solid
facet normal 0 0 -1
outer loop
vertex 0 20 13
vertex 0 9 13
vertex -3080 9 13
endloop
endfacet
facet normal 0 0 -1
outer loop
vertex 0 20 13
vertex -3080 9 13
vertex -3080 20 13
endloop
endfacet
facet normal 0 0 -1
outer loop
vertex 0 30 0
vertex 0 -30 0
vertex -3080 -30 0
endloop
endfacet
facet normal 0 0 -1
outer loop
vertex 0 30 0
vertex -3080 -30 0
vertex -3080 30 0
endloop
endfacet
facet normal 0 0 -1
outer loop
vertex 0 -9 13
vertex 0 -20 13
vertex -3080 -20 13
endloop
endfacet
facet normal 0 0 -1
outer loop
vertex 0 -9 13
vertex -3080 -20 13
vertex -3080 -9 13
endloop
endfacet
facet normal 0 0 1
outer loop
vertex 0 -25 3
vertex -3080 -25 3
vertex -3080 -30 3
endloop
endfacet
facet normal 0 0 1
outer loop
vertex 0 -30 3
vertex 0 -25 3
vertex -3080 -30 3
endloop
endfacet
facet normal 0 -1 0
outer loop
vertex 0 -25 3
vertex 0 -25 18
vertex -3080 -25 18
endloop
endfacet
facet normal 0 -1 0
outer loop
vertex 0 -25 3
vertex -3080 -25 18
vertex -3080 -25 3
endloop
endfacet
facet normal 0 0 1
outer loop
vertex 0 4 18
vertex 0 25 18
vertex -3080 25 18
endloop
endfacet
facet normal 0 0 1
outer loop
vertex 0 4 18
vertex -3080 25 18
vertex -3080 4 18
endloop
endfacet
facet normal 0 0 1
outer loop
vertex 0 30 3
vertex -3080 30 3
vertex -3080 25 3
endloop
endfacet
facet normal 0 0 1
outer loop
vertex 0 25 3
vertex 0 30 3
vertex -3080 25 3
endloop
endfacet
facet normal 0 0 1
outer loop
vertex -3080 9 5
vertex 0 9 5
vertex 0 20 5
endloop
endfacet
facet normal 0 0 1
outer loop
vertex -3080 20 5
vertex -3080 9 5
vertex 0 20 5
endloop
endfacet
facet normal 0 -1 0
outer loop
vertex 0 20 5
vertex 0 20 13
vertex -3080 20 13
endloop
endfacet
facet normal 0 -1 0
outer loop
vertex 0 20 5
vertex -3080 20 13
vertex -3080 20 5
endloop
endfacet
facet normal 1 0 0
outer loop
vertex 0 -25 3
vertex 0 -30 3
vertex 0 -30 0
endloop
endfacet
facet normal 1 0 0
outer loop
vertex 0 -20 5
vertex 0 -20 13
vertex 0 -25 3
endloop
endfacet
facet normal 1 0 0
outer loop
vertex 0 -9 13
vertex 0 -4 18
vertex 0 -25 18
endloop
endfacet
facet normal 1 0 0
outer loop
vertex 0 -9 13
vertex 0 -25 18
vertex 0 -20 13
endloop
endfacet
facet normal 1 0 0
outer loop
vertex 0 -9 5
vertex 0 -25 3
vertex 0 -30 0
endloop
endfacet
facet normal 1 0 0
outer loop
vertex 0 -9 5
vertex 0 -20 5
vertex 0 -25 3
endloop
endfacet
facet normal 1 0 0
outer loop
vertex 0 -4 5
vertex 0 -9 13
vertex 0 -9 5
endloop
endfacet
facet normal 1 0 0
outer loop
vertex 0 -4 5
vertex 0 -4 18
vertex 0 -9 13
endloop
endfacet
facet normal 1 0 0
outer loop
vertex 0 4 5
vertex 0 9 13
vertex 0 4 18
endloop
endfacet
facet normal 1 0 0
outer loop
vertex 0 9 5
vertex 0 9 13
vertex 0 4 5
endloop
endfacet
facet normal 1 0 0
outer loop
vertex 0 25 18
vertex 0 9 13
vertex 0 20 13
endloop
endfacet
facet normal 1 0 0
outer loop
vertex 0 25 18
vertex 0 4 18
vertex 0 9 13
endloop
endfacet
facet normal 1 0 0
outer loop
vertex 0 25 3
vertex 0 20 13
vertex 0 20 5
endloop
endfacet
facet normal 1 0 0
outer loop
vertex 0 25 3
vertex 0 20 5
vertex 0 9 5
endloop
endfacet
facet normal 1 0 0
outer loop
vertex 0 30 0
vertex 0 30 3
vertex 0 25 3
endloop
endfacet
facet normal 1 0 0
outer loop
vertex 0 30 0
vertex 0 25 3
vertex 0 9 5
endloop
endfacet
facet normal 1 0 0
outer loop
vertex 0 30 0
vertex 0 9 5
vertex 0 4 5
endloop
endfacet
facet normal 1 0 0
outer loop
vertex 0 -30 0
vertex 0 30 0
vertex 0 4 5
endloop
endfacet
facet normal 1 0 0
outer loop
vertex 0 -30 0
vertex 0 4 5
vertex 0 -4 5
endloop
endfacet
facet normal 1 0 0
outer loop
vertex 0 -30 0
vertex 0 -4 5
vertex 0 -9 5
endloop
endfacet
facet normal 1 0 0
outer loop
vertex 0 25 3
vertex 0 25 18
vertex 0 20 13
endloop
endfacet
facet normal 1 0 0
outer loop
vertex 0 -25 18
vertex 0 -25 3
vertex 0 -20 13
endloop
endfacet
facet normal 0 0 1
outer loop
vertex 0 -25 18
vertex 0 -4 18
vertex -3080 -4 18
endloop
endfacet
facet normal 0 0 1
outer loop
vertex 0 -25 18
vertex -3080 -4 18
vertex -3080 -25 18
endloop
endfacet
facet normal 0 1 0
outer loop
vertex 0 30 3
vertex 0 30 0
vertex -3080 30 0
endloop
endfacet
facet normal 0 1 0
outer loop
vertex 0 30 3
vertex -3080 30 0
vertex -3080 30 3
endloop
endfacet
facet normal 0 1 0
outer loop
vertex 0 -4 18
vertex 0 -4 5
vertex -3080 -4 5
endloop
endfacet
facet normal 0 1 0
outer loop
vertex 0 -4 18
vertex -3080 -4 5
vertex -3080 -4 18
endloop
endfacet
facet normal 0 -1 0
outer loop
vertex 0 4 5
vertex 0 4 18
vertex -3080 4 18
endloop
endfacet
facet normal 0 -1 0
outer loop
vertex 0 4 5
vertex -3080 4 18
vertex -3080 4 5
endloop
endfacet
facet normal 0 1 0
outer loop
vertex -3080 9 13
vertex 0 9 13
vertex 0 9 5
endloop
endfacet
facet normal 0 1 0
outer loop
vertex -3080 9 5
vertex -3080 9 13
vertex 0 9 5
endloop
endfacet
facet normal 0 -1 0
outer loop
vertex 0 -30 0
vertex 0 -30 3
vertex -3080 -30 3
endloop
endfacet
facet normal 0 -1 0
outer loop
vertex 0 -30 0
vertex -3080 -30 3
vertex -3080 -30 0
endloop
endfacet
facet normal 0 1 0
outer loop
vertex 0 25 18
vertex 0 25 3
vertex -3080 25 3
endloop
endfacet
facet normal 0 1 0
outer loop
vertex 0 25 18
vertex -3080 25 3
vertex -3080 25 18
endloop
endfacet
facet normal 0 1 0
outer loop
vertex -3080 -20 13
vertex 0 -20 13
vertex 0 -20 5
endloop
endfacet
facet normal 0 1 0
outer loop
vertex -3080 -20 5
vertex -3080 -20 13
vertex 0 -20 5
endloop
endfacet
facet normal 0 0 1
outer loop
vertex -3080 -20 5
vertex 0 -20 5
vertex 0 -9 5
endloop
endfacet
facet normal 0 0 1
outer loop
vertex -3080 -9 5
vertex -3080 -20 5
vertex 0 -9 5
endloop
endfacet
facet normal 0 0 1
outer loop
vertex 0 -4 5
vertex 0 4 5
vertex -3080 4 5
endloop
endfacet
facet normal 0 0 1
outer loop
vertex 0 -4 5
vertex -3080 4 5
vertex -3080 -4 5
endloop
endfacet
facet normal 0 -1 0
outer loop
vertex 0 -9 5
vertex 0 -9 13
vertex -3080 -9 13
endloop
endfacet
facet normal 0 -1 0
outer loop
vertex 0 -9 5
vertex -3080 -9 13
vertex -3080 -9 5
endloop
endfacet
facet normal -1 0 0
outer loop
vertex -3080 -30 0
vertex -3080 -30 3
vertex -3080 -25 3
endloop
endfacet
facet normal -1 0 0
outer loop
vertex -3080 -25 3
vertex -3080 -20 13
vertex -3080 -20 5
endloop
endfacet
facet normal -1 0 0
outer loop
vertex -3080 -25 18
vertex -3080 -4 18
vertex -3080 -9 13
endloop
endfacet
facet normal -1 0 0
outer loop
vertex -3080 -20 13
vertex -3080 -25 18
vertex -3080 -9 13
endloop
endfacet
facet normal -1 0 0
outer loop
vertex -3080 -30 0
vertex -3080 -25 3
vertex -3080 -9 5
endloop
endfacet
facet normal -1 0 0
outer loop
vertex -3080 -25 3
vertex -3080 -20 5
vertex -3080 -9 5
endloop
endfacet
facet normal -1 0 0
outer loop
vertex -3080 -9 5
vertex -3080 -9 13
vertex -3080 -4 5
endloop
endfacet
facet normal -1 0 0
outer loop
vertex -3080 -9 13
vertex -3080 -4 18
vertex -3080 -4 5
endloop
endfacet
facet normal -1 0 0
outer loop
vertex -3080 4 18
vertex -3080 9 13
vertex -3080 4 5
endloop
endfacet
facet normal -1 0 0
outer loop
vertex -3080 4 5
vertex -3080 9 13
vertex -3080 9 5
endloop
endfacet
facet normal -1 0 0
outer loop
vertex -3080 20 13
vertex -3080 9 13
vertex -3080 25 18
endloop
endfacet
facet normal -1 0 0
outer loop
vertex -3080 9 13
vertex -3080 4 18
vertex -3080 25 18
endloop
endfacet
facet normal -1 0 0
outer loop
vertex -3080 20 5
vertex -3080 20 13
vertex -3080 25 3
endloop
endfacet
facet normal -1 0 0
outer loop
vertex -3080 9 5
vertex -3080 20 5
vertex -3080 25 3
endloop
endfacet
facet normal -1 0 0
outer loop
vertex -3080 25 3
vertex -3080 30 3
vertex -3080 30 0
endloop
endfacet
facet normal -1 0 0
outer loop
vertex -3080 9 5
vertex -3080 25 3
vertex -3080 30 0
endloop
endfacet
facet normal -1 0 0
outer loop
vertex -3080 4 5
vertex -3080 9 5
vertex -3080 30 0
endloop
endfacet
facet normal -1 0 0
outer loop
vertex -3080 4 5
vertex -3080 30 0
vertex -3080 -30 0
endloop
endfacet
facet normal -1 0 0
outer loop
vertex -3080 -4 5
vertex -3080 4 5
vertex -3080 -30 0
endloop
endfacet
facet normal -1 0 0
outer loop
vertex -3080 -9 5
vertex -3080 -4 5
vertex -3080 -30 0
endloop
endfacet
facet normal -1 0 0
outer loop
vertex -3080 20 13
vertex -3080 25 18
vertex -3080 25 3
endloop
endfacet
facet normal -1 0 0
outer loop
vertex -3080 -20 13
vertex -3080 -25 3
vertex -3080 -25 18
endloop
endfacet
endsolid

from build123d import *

# Parameters (mm, degrees)
SKETCH_1_W      = 8
SKETCH_1_H      = 11
EXTRUDE_1_DEPTH = 3080


with BuildPart() as part:
    # Эскиз1 → Бобышка-Вытянуть1 (new body)
    with BuildSketch(Plane(origin=(0, 0, 0), x_dir=(0, 0, -1), z_dir=(1, 0, 0))):
        Polygon((0, -30), (0, 30), (-3, 30), (-3, 25), (-18, 25), (-18, 4), (-5, 4), (-5, -4), (-18, -4), (-18, -25), (-3, -25), (-3, -30), align=None)
        with Locations((-9, 14.5)):
            Rectangle(SKETCH_1_W, SKETCH_1_H, mode=Mode.SUBTRACT)
        with Locations((-9, -14.5)):
            Rectangle(SKETCH_1_W, SKETCH_1_H, mode=Mode.SUBTRACT)
    extrude(amount=-EXTRUDE_1_DEPTH)


solid = part.part
